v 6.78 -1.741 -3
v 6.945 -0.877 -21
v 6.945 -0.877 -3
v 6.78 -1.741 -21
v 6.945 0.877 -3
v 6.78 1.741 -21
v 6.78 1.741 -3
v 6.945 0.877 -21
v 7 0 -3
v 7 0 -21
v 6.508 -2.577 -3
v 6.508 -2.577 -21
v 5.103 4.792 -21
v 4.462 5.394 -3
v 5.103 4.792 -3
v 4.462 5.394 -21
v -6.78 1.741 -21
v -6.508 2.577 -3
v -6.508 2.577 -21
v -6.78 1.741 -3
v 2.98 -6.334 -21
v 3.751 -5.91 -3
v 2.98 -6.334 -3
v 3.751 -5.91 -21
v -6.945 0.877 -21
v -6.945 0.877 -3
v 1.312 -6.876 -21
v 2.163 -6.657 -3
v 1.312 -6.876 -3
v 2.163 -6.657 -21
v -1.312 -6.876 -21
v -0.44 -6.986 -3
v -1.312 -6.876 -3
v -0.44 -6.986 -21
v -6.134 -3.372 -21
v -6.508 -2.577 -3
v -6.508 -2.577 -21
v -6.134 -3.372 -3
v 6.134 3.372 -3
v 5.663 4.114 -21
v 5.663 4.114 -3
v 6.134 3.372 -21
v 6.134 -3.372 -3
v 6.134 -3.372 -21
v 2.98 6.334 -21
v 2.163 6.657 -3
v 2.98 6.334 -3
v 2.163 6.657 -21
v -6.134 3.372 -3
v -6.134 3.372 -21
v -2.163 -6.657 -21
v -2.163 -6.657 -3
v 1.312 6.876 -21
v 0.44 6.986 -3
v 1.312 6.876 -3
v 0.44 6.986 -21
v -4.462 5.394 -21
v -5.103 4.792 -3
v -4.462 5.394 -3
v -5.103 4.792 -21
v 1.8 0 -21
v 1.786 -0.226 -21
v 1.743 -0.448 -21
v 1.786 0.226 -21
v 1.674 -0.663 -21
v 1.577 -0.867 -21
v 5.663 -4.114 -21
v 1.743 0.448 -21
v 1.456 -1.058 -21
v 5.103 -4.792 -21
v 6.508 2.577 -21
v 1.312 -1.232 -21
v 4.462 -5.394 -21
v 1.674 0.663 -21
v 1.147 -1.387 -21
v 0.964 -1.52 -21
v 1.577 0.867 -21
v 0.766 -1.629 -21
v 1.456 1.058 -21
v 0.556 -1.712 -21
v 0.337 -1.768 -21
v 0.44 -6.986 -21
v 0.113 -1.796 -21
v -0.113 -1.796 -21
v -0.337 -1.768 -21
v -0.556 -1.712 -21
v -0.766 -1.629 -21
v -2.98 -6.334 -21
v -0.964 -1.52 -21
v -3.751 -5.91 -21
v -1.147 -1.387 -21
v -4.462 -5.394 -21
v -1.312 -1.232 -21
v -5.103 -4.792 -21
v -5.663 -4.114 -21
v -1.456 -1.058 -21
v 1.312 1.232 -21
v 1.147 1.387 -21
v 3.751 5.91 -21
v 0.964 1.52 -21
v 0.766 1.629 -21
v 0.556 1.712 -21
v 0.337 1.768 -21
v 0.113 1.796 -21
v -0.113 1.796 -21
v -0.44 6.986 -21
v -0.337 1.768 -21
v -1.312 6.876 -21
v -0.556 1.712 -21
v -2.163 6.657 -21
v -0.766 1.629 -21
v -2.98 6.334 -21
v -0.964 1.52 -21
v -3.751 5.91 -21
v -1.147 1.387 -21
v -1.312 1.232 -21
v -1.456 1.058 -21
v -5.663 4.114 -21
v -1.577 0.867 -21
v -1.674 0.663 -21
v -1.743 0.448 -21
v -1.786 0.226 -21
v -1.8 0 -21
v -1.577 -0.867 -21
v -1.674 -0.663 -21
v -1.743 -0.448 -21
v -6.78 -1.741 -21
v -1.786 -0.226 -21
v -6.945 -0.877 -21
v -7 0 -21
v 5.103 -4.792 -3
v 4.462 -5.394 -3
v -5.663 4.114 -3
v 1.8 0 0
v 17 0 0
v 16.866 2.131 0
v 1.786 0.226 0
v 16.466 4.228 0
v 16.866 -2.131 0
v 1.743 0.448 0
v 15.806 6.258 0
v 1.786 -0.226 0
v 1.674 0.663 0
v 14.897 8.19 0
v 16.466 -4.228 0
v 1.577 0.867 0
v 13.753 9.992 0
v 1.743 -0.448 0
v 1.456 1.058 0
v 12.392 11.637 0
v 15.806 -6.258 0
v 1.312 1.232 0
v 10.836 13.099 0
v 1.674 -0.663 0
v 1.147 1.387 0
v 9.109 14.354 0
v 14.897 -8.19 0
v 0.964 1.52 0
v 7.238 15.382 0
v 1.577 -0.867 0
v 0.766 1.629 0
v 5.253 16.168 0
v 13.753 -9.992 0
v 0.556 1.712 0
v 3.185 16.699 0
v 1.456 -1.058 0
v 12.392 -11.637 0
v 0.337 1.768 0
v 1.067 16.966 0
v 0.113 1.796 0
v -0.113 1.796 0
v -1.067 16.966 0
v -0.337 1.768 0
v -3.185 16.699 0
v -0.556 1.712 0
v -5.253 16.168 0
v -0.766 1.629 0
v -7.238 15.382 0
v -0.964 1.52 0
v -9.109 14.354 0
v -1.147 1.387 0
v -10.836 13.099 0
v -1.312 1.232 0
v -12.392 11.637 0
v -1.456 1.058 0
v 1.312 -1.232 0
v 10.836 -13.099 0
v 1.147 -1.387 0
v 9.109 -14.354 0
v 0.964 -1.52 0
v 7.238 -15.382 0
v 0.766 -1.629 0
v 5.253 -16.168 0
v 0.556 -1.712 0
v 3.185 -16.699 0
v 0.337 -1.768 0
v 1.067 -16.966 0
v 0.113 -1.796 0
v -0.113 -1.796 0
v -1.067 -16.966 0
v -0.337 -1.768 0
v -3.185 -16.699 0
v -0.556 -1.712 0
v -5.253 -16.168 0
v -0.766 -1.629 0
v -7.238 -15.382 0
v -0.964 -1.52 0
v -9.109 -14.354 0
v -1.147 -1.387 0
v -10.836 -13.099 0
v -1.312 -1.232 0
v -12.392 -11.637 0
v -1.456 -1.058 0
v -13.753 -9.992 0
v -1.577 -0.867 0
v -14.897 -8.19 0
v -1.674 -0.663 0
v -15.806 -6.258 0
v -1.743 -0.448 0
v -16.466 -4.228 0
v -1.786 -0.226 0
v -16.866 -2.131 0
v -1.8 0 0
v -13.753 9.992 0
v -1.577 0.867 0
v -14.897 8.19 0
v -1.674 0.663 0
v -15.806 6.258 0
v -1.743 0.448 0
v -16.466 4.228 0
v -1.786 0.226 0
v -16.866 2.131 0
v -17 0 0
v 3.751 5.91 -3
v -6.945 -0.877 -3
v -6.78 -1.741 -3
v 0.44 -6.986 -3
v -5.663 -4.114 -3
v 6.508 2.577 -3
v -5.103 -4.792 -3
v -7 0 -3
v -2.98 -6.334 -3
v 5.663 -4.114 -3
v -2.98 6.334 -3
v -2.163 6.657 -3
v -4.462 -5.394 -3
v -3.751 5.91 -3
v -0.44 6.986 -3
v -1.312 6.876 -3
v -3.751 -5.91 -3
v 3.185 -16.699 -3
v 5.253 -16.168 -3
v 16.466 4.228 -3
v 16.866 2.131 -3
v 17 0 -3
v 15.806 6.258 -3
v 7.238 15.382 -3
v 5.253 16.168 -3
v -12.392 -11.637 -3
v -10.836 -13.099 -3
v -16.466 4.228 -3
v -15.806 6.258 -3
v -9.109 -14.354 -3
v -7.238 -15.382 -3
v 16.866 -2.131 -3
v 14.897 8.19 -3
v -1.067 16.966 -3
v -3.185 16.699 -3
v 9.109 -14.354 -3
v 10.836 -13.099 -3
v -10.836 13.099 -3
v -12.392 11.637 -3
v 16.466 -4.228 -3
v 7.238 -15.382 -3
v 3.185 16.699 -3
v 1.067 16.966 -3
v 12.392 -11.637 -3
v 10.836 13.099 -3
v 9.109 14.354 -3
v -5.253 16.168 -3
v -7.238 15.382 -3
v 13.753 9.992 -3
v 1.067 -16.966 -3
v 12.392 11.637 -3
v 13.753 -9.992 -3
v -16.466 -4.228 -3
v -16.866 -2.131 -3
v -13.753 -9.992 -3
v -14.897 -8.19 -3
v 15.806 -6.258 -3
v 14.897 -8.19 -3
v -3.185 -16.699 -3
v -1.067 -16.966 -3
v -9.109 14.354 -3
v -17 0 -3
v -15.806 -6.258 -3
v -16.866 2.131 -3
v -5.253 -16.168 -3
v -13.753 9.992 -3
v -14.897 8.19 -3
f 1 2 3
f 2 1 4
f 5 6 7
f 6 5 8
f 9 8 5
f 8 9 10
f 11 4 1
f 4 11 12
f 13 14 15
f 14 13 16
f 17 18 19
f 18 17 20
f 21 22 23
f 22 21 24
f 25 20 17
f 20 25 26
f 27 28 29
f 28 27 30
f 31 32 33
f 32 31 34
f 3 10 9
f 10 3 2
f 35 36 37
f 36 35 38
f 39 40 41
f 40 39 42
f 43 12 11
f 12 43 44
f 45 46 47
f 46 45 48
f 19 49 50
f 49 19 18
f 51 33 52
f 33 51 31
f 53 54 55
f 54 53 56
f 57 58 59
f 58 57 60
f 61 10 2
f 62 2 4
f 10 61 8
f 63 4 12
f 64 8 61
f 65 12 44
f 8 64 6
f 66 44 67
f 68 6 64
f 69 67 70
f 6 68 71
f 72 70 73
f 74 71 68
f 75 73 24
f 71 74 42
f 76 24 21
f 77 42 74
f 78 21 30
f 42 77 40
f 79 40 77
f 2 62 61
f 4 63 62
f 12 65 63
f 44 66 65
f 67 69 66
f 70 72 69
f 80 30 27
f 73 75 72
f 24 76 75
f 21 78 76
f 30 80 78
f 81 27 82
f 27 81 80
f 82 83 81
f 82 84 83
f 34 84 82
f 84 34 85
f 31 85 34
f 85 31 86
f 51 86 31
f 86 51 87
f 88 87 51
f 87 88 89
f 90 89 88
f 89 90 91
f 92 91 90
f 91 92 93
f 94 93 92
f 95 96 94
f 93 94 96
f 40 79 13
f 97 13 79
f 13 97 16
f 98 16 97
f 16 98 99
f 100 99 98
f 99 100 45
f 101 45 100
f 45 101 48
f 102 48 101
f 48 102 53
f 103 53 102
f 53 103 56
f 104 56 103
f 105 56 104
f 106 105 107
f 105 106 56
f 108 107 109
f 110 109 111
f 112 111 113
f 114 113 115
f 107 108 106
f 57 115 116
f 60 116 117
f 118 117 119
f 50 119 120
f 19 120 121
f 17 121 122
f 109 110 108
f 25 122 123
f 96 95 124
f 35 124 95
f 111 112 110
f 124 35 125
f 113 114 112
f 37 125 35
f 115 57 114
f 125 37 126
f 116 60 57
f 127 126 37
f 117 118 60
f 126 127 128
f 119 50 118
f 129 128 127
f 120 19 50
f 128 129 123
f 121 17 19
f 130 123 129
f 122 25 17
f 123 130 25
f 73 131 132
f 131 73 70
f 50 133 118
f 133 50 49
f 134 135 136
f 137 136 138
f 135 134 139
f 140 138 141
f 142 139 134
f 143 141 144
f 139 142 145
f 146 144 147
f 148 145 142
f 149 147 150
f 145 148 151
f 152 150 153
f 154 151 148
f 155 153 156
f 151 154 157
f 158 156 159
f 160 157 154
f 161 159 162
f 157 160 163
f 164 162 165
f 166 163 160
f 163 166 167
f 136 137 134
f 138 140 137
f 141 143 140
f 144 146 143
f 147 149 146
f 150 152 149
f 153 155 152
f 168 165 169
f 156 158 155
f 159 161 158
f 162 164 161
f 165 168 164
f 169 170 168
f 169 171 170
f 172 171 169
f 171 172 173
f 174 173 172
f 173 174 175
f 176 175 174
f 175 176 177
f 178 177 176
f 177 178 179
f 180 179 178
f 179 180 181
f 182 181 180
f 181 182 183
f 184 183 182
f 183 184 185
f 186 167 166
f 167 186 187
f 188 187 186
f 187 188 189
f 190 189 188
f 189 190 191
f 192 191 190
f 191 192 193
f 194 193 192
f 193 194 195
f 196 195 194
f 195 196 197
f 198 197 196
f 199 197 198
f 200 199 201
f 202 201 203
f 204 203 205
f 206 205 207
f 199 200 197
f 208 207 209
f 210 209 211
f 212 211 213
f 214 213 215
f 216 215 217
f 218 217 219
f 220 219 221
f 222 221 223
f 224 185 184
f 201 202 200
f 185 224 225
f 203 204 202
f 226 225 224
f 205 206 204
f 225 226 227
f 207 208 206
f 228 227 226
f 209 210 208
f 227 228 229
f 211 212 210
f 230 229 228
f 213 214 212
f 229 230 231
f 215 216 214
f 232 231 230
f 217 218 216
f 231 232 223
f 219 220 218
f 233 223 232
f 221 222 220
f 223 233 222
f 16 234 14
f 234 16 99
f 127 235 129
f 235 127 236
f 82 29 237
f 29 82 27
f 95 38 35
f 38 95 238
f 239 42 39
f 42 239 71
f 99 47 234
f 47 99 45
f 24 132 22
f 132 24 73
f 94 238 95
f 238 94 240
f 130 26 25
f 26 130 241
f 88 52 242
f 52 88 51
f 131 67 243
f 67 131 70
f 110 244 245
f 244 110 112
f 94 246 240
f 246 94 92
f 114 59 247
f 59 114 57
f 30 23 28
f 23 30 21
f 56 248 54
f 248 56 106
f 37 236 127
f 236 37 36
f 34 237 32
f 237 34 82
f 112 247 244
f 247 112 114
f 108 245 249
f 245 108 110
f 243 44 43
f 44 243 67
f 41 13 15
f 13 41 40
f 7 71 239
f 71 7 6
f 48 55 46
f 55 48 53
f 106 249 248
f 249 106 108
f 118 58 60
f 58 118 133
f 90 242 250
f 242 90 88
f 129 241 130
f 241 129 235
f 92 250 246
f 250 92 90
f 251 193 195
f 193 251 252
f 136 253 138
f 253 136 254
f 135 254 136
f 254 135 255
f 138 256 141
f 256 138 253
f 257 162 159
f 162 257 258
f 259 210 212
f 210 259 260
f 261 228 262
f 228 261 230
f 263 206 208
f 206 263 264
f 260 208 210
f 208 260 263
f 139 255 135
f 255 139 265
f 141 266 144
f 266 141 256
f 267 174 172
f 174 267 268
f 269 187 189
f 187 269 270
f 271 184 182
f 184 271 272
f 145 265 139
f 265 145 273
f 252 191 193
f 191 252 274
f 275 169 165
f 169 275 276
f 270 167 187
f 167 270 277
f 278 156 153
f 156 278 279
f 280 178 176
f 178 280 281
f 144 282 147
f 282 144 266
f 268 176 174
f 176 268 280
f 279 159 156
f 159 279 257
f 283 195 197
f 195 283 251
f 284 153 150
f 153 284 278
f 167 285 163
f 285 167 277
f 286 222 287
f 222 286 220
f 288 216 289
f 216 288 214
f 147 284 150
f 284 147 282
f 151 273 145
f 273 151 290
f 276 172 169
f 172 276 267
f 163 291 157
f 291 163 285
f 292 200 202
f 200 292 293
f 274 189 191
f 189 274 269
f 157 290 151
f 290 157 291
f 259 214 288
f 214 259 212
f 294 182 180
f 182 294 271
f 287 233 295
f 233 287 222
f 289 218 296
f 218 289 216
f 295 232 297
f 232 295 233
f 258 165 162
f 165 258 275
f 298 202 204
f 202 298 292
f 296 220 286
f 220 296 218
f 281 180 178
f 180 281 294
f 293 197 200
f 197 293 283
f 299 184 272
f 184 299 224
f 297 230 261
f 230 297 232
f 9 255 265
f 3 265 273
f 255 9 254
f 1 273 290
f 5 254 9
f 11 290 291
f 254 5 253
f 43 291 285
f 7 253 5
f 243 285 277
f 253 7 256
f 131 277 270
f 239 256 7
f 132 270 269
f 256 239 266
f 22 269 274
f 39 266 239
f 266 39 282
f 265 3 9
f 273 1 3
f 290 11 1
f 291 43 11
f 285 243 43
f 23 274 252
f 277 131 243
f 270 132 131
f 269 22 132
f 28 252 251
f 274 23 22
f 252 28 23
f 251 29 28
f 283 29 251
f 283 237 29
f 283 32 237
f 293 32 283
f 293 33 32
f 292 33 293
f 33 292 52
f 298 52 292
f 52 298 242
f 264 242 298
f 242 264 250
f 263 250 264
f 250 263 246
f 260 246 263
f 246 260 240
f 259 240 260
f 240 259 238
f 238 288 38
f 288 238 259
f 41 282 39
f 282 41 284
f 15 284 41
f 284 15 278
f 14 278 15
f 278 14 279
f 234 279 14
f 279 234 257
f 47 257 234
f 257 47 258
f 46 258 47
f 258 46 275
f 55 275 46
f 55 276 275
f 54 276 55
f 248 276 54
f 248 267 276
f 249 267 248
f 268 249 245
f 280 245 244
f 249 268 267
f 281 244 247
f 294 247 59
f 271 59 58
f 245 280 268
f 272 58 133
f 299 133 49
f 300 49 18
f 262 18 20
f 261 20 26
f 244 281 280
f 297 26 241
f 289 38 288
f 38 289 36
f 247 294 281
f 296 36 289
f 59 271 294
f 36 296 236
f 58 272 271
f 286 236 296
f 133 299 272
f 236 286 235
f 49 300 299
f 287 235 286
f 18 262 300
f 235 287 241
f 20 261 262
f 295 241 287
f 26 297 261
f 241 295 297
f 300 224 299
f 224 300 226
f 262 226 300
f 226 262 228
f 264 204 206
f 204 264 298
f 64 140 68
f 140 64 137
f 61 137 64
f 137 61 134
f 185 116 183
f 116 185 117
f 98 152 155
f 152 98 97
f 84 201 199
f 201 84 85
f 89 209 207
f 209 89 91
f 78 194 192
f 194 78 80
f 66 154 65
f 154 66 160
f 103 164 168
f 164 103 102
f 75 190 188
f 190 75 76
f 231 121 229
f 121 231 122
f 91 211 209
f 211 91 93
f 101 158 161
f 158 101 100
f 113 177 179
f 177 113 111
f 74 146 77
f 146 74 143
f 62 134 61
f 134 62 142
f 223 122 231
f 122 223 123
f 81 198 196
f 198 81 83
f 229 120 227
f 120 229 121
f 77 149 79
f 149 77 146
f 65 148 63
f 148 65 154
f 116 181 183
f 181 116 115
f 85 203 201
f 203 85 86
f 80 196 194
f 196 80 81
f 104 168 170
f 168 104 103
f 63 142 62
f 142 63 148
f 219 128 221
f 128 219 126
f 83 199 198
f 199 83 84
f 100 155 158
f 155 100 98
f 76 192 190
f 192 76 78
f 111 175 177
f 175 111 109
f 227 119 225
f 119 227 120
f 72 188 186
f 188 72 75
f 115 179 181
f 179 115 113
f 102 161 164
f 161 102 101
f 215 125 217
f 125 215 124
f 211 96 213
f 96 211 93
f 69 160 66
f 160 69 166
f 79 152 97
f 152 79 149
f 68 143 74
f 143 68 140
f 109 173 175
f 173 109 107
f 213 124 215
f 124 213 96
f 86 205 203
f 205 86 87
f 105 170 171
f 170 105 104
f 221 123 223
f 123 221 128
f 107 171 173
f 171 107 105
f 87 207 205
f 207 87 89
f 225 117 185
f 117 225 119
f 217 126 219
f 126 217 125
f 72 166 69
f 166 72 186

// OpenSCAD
$fn = 50;


difference() {
	union() {
		translate(v = [0, 0, -21.0000000000]) {
			cylinder(h = 21, r = 7.0000000000);
		}
		translate(v = [0, 0, -3.0000000000]) {
			cylinder(h = 3, r = 17.0000000000);
		}
	}
	union() {
		#translate(v = [0, 0, -21]) {
			cylinder(h = 21, r = 1.8000000000);
		}
	}
}
